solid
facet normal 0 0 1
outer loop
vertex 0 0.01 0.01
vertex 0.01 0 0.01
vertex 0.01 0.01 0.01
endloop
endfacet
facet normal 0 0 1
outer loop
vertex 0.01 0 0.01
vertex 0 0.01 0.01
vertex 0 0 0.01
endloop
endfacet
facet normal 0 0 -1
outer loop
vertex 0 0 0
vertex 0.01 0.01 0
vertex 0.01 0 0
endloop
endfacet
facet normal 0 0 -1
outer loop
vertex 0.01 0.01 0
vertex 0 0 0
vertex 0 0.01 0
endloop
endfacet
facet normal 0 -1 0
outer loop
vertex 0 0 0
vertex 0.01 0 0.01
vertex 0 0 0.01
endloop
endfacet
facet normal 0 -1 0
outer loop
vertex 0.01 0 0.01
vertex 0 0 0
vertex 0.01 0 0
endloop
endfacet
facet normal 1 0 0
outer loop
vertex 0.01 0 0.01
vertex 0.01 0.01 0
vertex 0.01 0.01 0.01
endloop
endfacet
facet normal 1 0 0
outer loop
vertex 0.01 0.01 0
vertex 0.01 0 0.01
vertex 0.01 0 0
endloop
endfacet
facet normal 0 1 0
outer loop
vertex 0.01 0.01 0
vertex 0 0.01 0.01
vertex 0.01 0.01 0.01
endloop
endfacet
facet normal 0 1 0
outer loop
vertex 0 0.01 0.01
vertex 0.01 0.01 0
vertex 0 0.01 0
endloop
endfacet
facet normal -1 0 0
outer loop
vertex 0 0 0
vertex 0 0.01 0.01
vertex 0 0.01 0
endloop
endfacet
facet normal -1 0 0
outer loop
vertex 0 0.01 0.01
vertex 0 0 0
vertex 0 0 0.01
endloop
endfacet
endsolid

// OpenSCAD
/***
 * @function mate_trochoid_polar_radii
 * @brief Compare indexed motion radii with independent full-outline ray scans for both trochoid families.
 * Source: [`mate/trochoid_polar_radii.scad`](mate/trochoid_polar_radii.scad)
 */
include <../../src/hypotrochoid/mate.scad>
include <../../src/epitrochoid/mate.scad>
function ray_radius(points,angle) = max([for(i=[0:len(points)-1])
    let(a=points[i],b=points[(i+1)%len(points)],v=[cos(angle),sin(angle)],
        edge=b-a,den=v[0]*edge[1]-v[1]*edge[0],
        u=den==0 ? -1 : (a[0]*v[1]-a[1]*v[0])/den,
        r=den==0 ? -1 : (a[0]*edge[1]-a[1]*edge[0])/den)
    if(u>=-1e-9 && u<=1+1e-9 && r>=0) r]);
for(family=[0,1],ratios=[[3,1,.35],[5,1,.35],[2,1,.65]]) {
    R=ratios[0];r=ratios[1];d=ratios[2];n=240;
    points=family==0 ? _cg_hypotrochoid_points_scaled(1,R,r,d,n) : _cg_epitrochoid_points_scaled(1,R,r,d,n);
    table=_cg_trochoid_polar_table(points);
    direct=family==0 ? _cg_hypotrochoid_driver_radii(1,R,r,d,n) : _cg_epitrochoid_driver_radii(1,R,r,d,n);
    mid=family==0 ? _cg_hypotrochoid_motion_radii(1,R,r,d,n) : _cg_epitrochoid_motion_radii(1,R,r,d,n);
    for(i=[0:13:n-1]) {
        angle=360*i/n;
        assert(abs(direct[i]-ray_radius(points,angle))<1e-8,"driver radius uses curve parameter instead of polar angle");
        assert(abs(mid[i]-ray_radius(points,angle+180/n))<1e-8,"midpoint radius differs from the actual driver polygon");
        assert(abs(_cg_trochoid_radius_at_polar_angle(table,angle+360)-direct[i])<1e-8);
        assert(abs(_cg_trochoid_radius_at_polar_angle(table,angle-360)-direct[i])<1e-8);
    }
    D=_cg_solve_mate_distance(mid,max(direct)+.01,4*max(direct));
    integration=_cg_motion_integration_state(direct,mid,D);
    mate=_cg_mate_points_from_radius_samples_with_state(direct,D,integration);
    assert(abs(_cg_motion_closure_error(integration[2]))<.08,"correct physical-radius motion does not close");
    for(i=[0:13:n-1])
        assert(abs(_cg_vlen(mate[(n-i)%n])+ray_radius(points,360*i/n)-D)<1e-8,"mate pitch radius does not complement the actual driver");
}
echo("PASS: exact physical-ray radii, phase wrapping and conjugate pitch distances for both trochoid families");
cube(.01);
